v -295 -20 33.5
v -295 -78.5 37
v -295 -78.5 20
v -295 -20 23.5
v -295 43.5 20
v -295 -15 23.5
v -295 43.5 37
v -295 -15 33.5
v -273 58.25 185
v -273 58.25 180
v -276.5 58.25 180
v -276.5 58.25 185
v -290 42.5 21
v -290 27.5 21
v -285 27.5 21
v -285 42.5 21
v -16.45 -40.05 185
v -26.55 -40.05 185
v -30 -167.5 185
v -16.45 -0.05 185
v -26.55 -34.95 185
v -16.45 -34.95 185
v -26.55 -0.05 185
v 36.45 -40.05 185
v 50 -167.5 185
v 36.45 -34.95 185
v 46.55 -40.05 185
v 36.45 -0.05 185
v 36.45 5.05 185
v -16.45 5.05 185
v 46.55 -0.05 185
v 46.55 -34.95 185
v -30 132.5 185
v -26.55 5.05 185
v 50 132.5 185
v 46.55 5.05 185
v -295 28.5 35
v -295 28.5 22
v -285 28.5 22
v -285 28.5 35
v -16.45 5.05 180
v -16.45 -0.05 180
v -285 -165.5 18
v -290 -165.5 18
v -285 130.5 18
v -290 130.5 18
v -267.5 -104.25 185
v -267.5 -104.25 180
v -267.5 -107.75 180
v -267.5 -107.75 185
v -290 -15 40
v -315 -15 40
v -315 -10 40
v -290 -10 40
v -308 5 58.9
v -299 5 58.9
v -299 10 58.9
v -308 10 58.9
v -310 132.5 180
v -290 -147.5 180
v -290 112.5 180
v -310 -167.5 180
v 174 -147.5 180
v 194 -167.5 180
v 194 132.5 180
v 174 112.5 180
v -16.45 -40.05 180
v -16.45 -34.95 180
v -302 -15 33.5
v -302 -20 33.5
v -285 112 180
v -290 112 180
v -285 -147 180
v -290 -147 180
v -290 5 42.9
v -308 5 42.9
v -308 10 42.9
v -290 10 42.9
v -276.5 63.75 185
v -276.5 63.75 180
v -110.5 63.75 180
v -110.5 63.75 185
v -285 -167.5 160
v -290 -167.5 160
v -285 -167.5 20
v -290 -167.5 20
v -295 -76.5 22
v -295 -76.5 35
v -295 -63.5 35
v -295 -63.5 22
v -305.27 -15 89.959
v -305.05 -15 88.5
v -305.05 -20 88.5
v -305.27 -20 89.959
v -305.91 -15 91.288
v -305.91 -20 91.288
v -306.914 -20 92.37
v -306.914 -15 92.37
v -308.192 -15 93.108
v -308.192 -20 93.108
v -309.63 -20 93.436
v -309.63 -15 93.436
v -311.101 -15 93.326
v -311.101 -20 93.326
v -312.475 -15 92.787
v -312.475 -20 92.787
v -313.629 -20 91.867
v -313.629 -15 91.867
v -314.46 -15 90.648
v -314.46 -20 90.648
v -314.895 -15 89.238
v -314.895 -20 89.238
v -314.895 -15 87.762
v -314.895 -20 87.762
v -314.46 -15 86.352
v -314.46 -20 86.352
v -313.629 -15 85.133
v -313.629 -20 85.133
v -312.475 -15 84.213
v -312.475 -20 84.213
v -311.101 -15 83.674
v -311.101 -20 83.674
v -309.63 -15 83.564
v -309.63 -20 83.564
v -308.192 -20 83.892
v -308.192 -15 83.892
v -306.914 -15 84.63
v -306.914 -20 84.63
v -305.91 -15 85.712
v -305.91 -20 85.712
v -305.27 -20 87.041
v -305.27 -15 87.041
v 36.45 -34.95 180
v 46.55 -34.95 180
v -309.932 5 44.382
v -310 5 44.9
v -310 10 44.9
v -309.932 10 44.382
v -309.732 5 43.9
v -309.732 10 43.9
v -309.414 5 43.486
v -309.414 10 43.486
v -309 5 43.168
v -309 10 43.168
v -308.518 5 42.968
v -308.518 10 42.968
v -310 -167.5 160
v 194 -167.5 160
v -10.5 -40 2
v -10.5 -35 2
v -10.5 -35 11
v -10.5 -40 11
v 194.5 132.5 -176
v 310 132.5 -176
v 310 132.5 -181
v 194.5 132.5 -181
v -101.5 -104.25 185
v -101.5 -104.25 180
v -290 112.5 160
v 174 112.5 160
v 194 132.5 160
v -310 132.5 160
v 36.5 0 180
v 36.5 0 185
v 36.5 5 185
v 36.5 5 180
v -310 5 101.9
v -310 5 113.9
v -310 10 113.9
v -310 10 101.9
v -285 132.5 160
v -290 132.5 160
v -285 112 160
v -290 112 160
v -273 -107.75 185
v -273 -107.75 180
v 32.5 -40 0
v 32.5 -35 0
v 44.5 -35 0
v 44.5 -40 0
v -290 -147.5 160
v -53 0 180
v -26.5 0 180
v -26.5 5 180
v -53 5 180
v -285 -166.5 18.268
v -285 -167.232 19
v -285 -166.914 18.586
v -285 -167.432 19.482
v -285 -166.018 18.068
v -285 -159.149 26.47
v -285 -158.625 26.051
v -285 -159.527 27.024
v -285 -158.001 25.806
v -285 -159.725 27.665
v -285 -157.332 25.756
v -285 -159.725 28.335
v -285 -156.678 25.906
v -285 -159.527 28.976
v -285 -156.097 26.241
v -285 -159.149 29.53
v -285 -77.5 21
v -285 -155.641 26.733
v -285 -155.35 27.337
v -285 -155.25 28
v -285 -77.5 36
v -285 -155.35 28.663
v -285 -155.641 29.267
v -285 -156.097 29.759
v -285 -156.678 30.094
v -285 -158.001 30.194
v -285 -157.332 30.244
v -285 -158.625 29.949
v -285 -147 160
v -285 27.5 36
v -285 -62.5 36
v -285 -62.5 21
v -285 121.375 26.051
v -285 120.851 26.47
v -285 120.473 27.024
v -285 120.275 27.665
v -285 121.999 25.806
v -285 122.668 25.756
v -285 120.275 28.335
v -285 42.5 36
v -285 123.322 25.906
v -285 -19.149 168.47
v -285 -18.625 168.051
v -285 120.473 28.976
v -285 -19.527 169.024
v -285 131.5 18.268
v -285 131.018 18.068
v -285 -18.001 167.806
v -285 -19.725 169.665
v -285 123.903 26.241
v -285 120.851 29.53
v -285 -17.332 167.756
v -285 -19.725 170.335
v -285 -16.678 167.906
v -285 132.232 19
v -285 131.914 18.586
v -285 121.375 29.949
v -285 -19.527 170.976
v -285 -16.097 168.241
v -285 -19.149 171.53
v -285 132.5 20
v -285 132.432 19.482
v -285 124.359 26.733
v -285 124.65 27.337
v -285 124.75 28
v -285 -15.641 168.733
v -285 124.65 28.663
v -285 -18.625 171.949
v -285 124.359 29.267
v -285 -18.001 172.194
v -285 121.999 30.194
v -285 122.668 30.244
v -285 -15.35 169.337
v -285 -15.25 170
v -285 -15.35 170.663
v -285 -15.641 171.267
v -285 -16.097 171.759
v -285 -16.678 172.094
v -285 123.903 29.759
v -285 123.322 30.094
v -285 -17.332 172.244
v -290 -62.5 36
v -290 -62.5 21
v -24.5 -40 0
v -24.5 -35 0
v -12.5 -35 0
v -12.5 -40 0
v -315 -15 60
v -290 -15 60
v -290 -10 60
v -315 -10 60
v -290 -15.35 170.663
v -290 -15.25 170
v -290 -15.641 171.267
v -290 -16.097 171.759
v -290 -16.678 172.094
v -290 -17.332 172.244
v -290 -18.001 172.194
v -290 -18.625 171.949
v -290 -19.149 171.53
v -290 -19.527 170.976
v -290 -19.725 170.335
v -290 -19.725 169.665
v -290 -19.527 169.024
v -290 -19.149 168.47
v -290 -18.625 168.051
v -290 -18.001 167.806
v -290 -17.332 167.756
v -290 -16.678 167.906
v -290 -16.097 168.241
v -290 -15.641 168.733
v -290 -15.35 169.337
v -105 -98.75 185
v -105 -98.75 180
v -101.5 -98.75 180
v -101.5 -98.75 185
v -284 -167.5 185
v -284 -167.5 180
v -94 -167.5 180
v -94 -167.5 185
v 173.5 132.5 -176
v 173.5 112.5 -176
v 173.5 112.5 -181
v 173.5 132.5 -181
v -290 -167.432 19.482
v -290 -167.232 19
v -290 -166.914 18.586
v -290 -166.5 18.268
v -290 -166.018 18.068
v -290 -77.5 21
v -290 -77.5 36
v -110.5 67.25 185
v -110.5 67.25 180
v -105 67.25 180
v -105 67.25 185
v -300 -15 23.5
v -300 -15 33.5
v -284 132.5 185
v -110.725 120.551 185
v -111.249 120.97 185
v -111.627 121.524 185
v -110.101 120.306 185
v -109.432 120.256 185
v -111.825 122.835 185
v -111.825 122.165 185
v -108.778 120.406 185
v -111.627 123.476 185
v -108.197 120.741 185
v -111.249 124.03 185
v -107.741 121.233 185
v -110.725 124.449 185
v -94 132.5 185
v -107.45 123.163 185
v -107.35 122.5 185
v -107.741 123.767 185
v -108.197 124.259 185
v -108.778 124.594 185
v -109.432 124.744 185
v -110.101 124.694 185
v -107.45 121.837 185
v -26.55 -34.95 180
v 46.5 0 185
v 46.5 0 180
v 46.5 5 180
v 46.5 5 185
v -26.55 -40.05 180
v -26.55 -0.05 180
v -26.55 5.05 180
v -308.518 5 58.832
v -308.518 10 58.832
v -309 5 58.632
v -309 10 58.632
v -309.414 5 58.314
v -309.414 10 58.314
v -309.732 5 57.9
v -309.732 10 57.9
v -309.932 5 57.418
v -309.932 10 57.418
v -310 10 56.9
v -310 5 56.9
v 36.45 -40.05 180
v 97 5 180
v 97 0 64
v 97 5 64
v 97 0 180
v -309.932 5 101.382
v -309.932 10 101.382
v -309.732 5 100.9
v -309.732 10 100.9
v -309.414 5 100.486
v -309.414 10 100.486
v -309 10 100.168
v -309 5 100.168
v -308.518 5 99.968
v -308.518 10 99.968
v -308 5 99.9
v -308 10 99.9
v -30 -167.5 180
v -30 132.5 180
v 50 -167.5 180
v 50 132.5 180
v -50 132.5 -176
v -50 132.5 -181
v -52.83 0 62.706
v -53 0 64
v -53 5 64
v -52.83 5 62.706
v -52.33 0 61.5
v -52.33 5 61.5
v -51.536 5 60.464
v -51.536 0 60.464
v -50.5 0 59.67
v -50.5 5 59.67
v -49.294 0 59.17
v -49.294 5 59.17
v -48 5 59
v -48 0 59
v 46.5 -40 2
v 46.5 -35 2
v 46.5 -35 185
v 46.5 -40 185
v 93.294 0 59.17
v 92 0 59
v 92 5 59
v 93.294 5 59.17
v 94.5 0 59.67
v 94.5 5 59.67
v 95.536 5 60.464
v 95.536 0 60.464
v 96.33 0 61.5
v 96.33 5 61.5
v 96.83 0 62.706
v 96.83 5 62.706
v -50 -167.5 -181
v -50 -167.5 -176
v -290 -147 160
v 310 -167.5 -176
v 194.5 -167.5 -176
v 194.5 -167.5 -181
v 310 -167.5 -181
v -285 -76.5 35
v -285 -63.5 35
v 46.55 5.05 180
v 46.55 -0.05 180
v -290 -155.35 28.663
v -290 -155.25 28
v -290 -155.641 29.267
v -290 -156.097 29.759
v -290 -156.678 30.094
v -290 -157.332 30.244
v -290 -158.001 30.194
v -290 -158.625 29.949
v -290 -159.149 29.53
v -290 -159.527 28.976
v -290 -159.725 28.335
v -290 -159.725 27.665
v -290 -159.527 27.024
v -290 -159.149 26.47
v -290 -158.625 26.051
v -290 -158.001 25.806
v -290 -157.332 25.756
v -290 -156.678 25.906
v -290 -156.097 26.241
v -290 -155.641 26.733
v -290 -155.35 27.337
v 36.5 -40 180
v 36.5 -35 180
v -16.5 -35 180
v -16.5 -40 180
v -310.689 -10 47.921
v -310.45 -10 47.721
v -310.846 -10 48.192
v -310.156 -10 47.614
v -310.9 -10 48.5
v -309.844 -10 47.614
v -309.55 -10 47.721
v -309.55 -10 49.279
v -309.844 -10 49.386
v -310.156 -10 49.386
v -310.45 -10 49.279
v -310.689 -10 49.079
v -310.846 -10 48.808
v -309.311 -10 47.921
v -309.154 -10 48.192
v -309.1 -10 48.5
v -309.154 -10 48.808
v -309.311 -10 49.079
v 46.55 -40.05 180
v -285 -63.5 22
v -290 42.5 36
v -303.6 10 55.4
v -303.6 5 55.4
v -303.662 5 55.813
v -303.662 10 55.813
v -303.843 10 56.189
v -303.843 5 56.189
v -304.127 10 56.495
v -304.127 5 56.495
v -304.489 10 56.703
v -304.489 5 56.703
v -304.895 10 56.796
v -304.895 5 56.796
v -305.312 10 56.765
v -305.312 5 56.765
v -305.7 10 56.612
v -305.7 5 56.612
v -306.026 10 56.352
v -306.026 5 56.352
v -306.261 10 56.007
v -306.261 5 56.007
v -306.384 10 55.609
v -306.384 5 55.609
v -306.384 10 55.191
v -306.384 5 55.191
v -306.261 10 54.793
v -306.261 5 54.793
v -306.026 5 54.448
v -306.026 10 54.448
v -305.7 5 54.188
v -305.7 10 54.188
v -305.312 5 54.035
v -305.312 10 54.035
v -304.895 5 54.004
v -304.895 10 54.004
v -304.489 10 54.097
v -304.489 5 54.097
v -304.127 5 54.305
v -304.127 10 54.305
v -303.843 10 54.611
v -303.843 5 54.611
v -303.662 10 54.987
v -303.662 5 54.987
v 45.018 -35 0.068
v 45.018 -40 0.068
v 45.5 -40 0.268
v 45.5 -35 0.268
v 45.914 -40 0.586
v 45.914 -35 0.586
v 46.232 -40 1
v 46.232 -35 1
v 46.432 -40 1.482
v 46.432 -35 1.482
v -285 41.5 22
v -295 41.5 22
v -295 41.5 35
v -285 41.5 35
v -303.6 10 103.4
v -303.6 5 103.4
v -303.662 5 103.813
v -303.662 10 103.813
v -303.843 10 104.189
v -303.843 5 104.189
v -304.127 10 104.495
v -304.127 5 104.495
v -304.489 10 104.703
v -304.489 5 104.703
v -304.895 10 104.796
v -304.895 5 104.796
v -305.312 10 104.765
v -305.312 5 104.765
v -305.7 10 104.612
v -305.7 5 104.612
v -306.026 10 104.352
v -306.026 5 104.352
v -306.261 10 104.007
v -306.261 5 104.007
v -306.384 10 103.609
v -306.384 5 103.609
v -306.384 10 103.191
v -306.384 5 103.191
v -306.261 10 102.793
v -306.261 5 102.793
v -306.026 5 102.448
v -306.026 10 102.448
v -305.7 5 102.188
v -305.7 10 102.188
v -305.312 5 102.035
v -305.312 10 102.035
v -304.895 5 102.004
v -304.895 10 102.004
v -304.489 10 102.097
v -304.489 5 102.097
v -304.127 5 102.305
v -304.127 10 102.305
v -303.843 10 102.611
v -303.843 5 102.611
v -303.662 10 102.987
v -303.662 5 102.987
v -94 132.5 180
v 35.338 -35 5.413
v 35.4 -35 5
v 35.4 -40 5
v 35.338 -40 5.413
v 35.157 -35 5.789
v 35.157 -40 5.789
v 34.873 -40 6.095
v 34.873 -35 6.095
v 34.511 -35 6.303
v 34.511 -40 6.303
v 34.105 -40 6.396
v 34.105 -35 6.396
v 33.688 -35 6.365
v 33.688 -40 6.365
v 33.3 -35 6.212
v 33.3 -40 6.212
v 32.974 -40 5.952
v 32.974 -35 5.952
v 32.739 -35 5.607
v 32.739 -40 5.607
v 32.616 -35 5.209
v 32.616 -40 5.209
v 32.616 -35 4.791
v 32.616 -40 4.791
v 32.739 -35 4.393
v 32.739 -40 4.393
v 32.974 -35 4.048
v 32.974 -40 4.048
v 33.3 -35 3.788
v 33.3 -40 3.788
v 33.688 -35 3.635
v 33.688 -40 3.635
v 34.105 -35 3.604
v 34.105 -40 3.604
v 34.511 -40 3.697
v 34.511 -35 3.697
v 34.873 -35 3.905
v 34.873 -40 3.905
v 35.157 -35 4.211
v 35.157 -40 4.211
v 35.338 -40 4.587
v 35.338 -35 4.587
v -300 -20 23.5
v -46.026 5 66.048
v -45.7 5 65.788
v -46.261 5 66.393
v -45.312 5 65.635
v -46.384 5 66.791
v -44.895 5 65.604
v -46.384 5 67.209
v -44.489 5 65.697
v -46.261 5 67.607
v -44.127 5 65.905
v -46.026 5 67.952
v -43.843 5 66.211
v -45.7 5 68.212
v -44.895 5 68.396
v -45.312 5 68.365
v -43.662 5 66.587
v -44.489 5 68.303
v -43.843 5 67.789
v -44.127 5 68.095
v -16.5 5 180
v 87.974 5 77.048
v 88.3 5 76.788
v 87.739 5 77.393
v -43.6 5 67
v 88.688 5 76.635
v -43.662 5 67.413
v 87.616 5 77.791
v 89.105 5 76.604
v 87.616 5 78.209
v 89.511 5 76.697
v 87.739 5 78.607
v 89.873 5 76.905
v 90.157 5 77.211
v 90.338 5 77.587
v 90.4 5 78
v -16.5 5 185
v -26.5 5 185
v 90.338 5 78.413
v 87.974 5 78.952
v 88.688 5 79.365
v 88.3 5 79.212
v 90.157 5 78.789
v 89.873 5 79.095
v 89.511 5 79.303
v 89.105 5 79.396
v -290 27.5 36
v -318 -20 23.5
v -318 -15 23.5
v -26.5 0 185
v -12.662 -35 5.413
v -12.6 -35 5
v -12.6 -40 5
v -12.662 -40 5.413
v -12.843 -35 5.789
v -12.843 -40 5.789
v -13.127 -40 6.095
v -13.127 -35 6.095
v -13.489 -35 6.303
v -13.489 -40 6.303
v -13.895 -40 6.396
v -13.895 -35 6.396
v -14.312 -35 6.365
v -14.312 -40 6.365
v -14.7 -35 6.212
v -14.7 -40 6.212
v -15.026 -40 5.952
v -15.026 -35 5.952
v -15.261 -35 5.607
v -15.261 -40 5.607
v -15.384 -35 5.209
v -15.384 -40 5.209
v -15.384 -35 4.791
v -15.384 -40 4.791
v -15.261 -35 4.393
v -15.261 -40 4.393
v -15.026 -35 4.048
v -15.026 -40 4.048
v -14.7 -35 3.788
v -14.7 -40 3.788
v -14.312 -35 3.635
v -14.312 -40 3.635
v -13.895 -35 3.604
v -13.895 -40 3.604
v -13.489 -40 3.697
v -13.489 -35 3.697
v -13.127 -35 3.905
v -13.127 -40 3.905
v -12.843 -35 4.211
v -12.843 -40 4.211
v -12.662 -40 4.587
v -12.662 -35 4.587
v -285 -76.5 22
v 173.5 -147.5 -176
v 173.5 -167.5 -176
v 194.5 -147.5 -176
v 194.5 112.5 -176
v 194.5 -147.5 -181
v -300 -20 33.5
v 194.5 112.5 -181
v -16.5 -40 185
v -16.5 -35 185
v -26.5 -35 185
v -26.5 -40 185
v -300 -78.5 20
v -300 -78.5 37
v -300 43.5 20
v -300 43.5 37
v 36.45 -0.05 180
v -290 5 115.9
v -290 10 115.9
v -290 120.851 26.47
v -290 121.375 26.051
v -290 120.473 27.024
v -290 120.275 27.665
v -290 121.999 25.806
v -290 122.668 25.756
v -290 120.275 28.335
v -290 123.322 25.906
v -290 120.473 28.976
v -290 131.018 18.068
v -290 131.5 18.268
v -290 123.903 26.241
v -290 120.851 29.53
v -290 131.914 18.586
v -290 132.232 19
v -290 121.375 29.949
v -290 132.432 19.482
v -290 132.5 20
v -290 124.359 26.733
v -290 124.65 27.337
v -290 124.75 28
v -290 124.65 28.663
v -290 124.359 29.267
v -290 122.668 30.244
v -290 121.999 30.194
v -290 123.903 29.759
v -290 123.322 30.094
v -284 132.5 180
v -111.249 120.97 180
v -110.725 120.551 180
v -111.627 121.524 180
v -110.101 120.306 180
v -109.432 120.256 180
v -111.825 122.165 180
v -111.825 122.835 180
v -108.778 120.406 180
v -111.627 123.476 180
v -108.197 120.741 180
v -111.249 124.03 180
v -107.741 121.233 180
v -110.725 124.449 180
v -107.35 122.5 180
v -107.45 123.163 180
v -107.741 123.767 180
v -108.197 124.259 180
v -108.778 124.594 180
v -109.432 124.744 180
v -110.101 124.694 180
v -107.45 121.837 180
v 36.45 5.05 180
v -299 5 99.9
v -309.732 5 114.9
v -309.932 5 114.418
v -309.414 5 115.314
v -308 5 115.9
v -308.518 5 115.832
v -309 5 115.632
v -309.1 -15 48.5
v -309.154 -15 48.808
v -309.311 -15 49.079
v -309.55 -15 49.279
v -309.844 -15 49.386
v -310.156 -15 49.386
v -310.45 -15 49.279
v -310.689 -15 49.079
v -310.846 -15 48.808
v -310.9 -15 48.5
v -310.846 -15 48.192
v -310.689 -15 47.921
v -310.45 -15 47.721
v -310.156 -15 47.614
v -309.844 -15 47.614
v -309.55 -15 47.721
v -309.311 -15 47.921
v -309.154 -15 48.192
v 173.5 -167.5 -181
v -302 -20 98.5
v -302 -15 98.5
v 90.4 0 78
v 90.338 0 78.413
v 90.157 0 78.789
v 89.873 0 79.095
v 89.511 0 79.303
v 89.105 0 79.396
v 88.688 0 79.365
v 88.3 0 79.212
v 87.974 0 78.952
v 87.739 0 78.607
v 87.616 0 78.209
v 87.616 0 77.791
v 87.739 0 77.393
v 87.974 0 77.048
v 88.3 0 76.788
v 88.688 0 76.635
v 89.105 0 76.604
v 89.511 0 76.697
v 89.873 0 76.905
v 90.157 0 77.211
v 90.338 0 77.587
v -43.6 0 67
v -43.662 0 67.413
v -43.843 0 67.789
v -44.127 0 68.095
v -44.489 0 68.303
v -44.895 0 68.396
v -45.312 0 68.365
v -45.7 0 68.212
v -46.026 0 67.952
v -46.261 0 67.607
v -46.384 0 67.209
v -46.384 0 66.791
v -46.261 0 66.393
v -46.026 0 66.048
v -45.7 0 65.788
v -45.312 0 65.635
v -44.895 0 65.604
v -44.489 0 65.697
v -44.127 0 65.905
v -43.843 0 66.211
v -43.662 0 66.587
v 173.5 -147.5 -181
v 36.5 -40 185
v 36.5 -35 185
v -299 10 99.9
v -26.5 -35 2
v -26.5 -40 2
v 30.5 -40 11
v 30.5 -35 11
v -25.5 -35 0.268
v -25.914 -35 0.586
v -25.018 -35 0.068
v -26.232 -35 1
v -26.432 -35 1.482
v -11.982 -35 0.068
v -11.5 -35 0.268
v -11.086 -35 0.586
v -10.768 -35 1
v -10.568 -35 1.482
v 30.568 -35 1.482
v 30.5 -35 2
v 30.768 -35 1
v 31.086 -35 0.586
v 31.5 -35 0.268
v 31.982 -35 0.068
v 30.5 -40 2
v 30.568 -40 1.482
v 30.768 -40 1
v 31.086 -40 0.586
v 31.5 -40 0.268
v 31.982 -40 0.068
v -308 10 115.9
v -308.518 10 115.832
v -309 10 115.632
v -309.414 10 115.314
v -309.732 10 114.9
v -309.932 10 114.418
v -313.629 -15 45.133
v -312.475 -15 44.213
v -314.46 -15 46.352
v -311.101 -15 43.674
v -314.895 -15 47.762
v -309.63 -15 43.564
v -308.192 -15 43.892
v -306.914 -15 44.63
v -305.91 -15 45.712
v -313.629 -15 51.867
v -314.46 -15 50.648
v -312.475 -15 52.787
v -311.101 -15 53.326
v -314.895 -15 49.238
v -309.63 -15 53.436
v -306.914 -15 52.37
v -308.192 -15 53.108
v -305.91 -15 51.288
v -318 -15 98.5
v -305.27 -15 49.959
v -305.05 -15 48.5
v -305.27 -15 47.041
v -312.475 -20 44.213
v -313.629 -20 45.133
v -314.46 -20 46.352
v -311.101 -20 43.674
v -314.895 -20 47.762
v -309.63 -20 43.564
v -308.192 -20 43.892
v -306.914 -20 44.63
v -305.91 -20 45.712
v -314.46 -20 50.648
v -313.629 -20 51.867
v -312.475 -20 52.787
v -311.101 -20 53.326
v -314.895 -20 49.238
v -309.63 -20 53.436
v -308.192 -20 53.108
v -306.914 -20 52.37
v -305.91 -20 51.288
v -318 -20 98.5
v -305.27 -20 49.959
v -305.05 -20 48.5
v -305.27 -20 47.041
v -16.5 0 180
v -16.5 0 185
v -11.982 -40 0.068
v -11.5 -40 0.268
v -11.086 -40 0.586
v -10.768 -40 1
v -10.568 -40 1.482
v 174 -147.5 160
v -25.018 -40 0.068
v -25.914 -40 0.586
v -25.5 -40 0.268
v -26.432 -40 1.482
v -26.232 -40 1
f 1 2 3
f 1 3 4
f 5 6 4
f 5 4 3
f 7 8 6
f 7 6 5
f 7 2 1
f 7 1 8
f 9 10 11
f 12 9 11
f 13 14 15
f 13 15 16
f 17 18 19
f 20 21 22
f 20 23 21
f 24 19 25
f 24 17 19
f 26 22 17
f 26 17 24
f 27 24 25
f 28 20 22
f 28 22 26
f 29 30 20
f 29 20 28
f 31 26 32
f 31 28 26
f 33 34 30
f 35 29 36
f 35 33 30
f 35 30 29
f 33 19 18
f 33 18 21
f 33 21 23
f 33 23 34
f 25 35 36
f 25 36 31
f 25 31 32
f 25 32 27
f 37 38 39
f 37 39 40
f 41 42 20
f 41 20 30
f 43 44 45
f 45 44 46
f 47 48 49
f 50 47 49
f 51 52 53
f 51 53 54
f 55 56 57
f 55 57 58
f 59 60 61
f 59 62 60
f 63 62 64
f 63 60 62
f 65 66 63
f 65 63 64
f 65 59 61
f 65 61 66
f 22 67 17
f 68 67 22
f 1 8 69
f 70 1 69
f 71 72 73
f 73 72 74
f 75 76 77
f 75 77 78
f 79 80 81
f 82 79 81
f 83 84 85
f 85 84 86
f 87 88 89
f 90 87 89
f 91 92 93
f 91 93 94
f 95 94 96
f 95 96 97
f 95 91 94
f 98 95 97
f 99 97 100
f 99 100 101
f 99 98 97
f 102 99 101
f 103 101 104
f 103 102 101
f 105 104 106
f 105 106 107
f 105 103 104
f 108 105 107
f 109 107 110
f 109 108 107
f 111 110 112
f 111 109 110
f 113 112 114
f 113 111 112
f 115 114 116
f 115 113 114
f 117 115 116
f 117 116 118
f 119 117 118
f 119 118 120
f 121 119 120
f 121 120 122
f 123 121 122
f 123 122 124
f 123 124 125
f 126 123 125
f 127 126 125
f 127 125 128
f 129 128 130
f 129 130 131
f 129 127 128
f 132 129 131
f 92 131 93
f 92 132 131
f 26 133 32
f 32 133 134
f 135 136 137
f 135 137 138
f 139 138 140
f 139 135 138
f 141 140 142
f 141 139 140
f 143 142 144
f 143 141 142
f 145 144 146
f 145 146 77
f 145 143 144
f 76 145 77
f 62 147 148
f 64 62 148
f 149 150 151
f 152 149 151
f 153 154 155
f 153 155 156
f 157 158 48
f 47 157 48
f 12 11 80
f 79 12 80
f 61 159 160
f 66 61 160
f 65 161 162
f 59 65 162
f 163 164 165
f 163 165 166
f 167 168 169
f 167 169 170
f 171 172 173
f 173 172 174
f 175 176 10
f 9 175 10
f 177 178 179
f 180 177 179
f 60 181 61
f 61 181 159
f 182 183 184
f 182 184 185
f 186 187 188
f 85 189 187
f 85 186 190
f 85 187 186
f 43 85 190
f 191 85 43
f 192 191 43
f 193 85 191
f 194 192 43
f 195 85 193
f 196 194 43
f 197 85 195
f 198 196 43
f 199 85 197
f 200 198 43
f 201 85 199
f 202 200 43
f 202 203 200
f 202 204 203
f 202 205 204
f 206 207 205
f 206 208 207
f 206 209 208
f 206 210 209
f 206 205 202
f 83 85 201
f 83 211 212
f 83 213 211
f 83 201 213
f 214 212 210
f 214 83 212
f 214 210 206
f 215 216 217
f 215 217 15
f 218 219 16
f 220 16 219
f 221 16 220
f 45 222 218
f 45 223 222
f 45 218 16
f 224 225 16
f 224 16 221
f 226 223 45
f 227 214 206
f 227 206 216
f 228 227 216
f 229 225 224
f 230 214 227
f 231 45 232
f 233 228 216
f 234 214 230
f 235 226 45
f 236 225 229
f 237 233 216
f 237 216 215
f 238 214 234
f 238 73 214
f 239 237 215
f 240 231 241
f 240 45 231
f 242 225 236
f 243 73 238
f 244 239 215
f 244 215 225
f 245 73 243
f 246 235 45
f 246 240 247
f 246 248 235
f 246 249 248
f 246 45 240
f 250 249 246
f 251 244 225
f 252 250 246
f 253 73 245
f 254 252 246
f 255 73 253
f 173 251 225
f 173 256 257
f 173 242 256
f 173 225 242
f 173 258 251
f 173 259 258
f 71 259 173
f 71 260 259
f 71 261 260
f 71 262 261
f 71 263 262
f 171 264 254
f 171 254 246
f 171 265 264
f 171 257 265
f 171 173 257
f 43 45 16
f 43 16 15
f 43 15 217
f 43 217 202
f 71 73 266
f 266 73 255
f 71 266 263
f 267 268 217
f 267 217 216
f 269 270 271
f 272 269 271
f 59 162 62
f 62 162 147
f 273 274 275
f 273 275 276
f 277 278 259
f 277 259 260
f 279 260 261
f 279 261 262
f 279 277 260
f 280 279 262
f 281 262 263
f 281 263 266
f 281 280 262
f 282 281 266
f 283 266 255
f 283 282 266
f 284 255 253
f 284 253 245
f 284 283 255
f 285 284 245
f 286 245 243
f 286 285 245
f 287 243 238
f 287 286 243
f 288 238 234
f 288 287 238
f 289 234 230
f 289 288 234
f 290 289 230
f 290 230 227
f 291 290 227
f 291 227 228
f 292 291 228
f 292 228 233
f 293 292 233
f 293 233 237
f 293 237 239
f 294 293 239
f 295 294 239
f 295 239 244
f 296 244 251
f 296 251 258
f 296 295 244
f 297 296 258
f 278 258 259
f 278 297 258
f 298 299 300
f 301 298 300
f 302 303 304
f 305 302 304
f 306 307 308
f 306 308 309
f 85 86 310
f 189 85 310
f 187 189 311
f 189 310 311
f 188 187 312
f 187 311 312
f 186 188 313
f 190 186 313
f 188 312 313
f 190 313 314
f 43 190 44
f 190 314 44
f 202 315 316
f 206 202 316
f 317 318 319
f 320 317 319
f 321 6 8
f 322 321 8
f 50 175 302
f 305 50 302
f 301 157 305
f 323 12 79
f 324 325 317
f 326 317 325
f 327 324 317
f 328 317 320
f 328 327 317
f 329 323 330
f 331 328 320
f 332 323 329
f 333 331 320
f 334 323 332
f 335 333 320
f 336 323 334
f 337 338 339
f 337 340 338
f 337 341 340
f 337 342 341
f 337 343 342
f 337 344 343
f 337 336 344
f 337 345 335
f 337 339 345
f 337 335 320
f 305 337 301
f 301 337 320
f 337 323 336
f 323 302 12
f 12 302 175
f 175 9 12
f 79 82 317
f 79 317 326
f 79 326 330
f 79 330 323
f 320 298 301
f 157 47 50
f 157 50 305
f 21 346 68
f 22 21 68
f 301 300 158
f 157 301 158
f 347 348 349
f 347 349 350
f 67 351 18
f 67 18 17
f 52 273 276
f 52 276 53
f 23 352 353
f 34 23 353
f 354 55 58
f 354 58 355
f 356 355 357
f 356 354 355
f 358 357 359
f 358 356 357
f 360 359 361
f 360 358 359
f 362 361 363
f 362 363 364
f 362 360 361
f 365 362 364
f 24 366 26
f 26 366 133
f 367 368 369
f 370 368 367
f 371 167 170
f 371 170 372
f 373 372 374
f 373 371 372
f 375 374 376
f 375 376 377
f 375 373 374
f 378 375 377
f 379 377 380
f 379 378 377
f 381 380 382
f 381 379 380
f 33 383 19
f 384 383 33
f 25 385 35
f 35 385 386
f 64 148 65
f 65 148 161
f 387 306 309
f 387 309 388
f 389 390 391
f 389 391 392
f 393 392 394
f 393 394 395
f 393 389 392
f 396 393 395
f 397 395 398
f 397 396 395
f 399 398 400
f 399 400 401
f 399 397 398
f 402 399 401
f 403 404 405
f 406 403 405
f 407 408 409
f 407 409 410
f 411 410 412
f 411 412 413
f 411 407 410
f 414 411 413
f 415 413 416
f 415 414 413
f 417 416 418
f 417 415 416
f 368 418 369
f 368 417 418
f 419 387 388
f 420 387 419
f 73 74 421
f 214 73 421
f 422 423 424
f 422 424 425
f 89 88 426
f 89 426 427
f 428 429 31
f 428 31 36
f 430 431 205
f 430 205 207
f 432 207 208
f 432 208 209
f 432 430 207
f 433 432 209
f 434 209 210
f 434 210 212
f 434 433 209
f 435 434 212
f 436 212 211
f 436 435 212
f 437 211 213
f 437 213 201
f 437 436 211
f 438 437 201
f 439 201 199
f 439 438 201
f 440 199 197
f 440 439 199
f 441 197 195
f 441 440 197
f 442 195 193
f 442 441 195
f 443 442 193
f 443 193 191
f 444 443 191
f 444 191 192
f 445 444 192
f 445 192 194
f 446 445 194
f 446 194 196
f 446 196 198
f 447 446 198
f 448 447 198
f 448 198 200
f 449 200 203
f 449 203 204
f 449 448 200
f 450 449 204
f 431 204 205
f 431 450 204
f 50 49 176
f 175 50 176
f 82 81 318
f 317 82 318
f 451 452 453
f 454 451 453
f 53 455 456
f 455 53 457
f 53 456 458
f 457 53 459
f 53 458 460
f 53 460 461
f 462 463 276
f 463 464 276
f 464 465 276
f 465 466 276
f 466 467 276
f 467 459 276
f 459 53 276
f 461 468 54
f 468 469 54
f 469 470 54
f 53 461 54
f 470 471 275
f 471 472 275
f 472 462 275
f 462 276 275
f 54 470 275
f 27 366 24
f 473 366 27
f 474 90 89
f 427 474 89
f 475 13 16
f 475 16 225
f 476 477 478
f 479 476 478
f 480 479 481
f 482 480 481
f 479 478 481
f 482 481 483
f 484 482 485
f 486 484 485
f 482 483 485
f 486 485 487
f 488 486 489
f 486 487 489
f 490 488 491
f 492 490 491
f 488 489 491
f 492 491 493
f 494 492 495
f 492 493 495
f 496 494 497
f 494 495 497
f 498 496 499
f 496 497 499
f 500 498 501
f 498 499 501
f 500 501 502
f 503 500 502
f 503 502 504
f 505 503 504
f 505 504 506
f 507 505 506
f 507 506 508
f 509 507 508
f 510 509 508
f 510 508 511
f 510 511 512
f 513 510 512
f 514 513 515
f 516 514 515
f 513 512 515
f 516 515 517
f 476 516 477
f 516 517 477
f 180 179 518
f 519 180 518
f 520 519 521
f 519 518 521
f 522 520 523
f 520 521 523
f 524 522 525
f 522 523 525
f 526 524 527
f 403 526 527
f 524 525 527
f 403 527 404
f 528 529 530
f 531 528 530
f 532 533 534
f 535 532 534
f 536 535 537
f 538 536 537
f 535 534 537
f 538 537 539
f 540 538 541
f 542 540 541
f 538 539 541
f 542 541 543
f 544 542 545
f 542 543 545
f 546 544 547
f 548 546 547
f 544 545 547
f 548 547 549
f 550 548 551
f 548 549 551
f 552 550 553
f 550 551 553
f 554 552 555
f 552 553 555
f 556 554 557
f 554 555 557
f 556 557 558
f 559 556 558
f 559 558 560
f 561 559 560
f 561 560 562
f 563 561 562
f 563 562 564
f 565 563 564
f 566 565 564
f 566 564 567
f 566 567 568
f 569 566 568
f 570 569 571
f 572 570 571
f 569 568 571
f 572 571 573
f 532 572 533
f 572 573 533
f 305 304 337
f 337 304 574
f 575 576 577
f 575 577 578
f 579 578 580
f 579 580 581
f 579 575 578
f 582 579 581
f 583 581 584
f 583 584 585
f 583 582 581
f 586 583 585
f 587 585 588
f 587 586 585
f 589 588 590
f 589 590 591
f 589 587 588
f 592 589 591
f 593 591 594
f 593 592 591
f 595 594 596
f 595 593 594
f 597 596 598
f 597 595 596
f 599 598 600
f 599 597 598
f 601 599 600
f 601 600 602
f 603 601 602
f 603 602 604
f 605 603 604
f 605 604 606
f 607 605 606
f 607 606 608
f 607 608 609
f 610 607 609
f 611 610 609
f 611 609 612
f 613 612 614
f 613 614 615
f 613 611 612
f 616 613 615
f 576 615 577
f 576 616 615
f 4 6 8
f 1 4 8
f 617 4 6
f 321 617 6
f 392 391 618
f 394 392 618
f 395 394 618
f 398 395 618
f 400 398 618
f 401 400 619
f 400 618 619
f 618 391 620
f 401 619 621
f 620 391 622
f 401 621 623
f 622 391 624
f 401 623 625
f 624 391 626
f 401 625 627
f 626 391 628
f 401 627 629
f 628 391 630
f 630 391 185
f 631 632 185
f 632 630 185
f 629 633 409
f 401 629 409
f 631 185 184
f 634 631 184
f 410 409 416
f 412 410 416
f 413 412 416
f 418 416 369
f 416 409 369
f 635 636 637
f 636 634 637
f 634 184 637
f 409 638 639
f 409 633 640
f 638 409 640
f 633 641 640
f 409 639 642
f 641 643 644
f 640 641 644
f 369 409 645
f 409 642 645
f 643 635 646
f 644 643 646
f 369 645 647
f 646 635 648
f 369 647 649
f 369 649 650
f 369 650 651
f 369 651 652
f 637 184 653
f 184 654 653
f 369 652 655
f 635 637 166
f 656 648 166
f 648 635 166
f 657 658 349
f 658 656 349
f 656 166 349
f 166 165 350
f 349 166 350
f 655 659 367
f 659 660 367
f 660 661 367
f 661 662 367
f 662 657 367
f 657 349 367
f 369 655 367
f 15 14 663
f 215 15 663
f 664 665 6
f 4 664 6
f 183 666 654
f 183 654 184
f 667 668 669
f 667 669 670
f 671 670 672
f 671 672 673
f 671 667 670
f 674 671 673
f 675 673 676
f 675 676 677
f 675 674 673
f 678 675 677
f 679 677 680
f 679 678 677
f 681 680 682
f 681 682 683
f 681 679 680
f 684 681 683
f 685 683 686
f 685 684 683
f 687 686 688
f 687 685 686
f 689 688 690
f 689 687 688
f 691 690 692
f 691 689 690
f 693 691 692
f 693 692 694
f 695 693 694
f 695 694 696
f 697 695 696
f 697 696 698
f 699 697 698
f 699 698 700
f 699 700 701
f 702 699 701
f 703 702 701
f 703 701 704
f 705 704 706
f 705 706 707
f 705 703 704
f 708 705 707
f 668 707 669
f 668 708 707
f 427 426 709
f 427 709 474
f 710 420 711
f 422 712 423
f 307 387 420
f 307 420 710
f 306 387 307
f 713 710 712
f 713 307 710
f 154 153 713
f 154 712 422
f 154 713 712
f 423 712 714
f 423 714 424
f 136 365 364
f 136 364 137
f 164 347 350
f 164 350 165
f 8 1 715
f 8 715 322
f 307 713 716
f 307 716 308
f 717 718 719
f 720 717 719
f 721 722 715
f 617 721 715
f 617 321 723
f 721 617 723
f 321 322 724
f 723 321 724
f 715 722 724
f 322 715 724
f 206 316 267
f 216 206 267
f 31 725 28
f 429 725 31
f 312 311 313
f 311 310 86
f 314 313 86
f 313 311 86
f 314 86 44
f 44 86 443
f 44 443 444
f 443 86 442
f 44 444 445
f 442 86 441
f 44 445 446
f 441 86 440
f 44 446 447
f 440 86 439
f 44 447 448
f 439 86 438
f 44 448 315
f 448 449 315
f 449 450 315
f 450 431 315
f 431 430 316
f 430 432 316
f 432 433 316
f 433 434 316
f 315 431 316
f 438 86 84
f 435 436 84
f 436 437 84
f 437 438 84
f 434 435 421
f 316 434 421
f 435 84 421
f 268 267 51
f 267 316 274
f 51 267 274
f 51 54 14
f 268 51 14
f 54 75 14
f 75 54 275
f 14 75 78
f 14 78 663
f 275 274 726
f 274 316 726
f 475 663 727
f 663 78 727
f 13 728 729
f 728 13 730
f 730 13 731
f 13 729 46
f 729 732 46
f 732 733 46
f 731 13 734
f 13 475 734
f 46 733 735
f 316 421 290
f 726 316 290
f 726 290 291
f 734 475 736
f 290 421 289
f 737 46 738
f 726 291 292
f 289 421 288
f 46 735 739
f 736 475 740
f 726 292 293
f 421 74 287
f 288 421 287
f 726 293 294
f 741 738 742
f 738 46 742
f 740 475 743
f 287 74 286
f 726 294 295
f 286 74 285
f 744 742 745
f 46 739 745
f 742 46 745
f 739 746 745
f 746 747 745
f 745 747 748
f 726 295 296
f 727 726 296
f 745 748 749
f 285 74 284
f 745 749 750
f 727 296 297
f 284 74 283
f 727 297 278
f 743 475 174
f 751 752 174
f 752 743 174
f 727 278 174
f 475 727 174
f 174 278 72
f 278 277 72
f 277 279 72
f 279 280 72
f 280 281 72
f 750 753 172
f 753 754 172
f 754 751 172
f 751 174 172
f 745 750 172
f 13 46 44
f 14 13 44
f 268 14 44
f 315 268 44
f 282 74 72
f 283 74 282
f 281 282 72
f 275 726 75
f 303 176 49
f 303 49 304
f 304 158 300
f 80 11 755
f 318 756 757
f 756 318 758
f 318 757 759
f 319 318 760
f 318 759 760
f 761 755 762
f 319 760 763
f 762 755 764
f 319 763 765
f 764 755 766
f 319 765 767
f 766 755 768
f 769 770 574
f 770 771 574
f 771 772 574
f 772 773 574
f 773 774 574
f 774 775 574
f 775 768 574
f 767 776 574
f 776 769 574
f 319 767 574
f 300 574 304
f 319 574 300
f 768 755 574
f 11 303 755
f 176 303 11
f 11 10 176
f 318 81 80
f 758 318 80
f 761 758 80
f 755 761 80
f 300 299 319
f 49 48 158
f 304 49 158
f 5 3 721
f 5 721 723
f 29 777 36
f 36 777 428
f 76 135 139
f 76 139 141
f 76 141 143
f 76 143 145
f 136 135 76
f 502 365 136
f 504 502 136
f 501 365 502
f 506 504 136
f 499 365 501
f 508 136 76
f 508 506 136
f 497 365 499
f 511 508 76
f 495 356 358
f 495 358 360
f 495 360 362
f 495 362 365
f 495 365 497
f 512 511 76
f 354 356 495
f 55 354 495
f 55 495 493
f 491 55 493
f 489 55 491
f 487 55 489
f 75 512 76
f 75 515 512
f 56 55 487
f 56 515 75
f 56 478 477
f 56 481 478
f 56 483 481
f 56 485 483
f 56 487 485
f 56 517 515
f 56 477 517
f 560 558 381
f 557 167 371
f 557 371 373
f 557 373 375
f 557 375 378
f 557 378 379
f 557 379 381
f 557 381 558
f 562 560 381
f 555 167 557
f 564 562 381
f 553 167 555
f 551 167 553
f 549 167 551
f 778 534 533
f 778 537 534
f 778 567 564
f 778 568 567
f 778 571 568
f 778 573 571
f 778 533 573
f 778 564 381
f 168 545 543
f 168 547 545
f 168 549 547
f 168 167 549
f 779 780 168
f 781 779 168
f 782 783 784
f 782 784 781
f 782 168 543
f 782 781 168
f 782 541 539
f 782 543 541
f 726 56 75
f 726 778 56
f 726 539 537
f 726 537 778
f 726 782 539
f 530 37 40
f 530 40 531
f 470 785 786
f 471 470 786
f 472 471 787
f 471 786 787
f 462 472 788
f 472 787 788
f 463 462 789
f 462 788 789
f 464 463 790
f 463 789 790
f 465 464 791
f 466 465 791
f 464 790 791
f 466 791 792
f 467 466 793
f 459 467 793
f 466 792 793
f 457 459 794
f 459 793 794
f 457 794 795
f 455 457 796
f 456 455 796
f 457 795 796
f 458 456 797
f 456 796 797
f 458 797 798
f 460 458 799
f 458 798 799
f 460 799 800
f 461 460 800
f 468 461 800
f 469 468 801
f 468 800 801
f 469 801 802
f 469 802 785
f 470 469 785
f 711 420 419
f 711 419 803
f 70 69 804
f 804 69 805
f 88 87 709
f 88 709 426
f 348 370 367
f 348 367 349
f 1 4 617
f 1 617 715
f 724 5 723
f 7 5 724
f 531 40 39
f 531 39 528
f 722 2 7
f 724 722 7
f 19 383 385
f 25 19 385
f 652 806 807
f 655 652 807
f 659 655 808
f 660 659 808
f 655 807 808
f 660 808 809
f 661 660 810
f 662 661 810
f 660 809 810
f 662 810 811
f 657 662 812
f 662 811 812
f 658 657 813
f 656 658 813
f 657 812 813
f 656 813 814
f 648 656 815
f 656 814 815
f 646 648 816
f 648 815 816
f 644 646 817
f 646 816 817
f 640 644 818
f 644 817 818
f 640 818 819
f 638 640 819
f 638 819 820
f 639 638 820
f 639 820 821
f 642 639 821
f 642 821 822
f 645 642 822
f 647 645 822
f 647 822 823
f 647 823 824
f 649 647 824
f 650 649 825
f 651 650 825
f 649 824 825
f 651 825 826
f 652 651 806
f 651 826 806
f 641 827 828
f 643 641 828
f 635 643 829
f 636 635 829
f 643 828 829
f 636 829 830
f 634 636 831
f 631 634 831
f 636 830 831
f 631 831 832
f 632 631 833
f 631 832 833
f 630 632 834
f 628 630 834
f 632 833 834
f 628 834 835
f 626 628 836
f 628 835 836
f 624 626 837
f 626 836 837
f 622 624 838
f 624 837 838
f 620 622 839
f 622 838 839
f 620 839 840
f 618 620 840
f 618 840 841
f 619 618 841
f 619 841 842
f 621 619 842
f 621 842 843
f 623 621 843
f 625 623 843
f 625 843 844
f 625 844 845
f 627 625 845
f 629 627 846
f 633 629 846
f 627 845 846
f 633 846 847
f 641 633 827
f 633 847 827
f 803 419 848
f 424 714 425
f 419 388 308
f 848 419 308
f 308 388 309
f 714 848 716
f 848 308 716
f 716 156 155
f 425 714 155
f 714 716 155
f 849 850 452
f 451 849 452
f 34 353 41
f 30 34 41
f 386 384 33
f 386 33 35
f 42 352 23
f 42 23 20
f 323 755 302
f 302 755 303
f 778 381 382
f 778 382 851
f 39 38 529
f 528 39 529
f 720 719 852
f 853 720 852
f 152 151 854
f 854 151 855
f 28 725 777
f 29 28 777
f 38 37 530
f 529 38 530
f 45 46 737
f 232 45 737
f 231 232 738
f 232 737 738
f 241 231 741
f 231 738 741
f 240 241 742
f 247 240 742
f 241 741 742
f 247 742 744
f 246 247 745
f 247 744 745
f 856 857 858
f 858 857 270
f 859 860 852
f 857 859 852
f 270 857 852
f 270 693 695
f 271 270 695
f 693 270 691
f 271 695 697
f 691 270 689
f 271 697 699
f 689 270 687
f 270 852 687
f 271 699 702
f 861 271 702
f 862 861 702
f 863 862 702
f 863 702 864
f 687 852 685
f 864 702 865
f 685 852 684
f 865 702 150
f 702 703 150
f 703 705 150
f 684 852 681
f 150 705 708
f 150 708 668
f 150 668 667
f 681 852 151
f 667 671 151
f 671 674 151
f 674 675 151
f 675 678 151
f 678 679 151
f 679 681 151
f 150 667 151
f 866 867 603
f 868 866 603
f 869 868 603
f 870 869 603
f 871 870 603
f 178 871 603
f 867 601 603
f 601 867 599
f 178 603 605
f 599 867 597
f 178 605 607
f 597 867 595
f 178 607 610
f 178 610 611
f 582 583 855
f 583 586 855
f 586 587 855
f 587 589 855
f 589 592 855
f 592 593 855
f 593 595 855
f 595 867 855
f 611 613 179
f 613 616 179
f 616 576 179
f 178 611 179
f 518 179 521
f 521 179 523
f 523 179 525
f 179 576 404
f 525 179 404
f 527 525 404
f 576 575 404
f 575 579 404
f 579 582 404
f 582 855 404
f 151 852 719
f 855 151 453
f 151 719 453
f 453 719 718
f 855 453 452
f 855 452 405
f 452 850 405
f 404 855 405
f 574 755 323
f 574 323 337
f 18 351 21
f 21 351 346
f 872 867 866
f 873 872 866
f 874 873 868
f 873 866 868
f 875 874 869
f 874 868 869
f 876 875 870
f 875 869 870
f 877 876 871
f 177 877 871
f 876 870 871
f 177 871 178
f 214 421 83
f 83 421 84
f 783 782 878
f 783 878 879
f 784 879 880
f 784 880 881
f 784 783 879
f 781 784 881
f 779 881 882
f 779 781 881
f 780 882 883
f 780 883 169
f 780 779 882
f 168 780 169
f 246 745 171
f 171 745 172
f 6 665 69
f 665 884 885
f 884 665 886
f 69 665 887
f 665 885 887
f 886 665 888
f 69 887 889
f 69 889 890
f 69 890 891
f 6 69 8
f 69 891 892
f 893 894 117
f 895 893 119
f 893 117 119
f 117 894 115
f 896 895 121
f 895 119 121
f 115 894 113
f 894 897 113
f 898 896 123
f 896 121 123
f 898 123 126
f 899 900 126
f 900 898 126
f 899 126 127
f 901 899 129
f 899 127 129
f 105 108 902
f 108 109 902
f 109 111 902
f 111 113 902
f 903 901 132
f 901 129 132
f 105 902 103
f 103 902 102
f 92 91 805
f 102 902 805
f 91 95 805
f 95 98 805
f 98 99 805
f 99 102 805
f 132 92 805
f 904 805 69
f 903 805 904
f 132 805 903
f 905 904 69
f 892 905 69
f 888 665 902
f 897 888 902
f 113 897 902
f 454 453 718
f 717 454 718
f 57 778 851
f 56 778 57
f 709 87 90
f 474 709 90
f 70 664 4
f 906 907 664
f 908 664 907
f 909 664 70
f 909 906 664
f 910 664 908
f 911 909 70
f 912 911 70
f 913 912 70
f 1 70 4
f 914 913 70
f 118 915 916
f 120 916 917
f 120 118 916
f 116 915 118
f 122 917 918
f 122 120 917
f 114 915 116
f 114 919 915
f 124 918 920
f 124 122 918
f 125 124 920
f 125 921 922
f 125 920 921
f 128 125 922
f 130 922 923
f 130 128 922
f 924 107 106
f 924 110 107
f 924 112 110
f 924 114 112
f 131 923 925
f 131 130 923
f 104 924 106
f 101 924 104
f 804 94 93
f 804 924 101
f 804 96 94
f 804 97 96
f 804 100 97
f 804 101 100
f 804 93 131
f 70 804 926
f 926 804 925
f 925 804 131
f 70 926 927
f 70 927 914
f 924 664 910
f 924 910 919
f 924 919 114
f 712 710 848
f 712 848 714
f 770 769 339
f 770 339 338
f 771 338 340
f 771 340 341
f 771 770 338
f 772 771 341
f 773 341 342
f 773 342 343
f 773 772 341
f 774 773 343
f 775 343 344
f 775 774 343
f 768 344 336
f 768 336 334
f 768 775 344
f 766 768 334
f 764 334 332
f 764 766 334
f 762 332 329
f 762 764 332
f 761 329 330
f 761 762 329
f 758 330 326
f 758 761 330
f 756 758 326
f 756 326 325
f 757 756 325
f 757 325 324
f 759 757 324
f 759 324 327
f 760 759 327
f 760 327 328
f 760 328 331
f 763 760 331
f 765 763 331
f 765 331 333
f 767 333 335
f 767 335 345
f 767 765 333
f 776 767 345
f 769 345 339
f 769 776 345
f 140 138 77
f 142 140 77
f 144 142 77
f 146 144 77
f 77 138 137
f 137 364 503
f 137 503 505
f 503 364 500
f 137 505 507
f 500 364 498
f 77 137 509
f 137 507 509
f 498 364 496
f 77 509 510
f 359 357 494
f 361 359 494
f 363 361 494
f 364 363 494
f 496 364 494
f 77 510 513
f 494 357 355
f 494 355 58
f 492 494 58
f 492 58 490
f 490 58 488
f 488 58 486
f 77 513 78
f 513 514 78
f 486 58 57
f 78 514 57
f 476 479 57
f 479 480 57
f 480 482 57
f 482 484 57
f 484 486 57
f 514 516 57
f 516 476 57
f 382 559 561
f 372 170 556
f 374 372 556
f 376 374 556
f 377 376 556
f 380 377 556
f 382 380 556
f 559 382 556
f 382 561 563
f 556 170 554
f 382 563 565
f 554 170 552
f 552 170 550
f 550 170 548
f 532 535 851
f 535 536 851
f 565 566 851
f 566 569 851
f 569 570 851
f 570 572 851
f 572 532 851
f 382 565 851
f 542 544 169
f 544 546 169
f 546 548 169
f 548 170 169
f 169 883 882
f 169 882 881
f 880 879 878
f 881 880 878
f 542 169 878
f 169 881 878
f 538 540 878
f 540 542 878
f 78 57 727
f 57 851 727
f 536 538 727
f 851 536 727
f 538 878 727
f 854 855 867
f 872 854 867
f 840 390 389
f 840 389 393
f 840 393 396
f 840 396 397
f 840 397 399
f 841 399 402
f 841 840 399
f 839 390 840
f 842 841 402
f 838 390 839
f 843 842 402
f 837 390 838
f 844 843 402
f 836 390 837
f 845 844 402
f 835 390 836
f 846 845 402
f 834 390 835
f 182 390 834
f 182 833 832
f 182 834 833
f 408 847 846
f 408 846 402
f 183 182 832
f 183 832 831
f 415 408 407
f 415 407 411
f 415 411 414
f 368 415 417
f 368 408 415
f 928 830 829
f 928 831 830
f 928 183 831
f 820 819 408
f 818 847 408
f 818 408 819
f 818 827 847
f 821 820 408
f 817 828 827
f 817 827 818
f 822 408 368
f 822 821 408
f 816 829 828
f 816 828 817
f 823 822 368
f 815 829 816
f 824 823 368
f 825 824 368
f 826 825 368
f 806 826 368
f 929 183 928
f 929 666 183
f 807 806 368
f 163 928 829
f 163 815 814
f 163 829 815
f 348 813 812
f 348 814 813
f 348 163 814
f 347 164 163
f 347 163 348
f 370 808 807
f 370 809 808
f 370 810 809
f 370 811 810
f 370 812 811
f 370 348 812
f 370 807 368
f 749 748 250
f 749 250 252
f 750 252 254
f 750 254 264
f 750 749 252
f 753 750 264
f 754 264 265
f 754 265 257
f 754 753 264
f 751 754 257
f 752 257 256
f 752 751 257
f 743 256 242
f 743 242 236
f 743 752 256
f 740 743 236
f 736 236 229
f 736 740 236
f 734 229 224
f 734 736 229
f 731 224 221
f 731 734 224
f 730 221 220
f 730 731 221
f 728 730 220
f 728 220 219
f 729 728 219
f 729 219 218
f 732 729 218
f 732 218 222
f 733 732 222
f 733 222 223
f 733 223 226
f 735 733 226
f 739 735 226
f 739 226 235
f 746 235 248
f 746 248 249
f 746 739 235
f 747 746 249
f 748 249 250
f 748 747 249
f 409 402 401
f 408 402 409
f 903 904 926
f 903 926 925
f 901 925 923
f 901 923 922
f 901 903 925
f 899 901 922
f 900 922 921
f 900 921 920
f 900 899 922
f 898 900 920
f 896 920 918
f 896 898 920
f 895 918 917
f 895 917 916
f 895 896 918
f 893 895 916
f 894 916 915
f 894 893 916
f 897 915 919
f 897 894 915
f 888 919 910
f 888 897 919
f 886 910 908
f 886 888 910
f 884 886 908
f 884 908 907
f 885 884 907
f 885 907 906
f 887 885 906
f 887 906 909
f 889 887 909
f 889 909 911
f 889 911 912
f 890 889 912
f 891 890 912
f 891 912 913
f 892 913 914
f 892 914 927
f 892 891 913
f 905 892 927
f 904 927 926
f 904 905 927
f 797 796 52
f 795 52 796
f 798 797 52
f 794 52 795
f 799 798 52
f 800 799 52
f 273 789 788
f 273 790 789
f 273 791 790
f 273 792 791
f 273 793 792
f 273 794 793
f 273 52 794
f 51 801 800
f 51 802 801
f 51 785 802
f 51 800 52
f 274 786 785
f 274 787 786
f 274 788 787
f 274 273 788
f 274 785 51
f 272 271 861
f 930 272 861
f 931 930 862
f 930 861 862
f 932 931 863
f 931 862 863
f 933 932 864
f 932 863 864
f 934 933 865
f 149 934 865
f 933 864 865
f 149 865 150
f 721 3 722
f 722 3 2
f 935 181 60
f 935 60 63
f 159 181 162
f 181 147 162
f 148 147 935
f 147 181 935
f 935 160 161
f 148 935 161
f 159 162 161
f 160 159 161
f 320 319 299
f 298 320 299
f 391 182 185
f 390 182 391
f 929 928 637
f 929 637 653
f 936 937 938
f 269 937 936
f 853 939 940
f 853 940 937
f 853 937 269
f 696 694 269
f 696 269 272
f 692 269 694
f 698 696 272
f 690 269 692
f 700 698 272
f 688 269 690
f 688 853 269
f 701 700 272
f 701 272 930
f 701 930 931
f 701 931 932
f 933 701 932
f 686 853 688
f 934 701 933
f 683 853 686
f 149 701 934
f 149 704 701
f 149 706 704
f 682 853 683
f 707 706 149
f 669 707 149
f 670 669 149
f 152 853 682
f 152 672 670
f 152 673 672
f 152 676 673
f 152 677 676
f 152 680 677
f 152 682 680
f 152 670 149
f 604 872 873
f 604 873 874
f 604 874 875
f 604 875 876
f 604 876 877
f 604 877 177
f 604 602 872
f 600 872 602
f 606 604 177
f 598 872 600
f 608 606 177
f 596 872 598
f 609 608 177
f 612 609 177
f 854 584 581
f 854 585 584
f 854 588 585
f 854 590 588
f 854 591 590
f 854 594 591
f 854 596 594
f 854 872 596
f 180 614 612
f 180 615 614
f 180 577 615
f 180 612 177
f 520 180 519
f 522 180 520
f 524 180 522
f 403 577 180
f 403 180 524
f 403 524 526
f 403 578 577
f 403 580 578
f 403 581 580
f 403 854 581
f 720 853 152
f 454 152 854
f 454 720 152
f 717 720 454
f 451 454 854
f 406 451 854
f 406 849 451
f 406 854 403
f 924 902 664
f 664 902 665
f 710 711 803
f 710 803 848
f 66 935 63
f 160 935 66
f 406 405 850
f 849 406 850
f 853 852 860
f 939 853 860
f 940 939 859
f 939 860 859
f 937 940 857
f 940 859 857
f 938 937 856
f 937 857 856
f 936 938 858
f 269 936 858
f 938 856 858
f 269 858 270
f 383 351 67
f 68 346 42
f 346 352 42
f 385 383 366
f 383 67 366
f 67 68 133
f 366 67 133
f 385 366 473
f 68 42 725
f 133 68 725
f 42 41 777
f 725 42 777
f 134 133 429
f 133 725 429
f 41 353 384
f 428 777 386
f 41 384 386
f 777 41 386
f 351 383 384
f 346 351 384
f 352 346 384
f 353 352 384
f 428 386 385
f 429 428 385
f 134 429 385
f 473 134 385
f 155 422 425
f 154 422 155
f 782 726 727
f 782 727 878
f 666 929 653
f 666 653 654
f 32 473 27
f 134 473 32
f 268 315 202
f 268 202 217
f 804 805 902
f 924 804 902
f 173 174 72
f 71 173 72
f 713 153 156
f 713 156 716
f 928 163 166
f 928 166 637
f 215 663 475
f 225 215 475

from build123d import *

# Parameters (mm, degrees)
F2_R      = 1.4
F3_DEPTH  = 5
F0_R      = 1.4
F4_DEPTH  = 5
F9_W      = 464
F9_H      = 20
F9_W_2    = 20
F9_H_2    = 260
F10_DEPTH = 20
F11_DEPTH = 5
F16_W     = 190
F16_H     = 260
F16_H_2   = 20
F16_R     = 2.25
F17_DEPTH = 5
F18_W     = 80
F18_H     = 300
F18_W_2   = 10.1
F18_H_2   = 5.1
F19_DEPTH = 5
F15_R     = 2.25
F15_W     = 15
F15_H     = 15
F22_DEPTH = 5
F21_W     = 13
F21_H     = 13
F23_DEPTH = 10
F24_W     = 122
F24_H     = 17
F24_W_2   = 5
F24_H_2   = 10
F25_DEPTH = 5
F27_R     = 0.9
F28_DEPTH = 5
F30_R     = 1.4
F31_DEPTH = 5
F32_R     = 4.95
F33_DEPTH = 5


# Not quite as in the source:
# - a feature of the source that left no trace in its solid (it failed there, or was rolled back) is left out
# - a feature names something its author has since deleted; it is built from what else it names


with BuildPart() as f3:
    # F2 (on offset) → F3 (new body)
    with BuildSketch(Plane.XZ.offset(35)):
        with BuildLine():
            ThreePointArc((-26.5, 2), (-25.9142135624, 0.5857864376), (-24.5, 0))
            Line((-24.5, 0), (-12.5, 0))
            ThreePointArc((-12.5, 0), (-11.0857864376, 0.5857864376), (-10.5, 2))
            Line((-10.5, 2), (-10.5, 11))
            Line((-10.5, 11), (30.5, 11))
            Line((30.5, 11), (30.5, 2))
            ThreePointArc((30.5, 2), (31.0857864376, 0.5857864376), (32.5, 0))
            Line((32.5, 0), (44.5, 0))
            ThreePointArc((44.5, 0), (45.9142135624, 0.5857864376), (46.5, 2))
            Line((46.5, 2), (46.5, 100))
            Line((46.5, 100), (46.5, 185))
            Line((46.5, 185), (36.5, 185))
            Line((36.5, 185), (36.5, 180))
            Line((36.5, 180), (-16.5, 180))
            Line((-16.5, 180), (-16.5, 185))
            Line((-16.5, 185), (-26.5, 185))
            Line((-26.5, 185), (-26.5, 180))
            Line((-26.5, 180), (-26.5, 2))
        make_face()
        with Locations((-14, 5)):
            Circle(F2_R, mode=Mode.SUBTRACT)
        with Locations((34, 5)):
            Circle(F2_R, mode=Mode.SUBTRACT)
    extrude(amount=F3_DEPTH)


with BuildPart() as f4:
    # F0 (on Front) → F4 (new body)
    with BuildSketch(Plane.XZ):
        with BuildLine():
            Line((-53, 180), (-53, 64))
            ThreePointArc((-53, 64), (-51.5355339059, 60.4644660941), (-48, 59))
            Line((-48, 59), (92, 59))
            ThreePointArc((92, 59), (95.5355339059, 60.4644660941), (97, 64))
            Line((97, 64), (97, 180))
            Line((97, 180), (46.5, 180))
            Line((46.5, 180), (46.5, 185))
            Line((46.5, 185), (36.5, 185))
            Line((36.5, 185), (36.5, 180))
            Line((36.5, 180), (-16.5, 180))
            Line((-16.5, 180), (-16.5, 185))
            Line((-16.5, 185), (-26.5, 185))
            Line((-26.5, 185), (-26.5, 180))
            Line((-26.5, 180), (-53, 180))
        make_face()
        with Locations((-45, 67)):
            Circle(F0_R, mode=Mode.SUBTRACT)
        with Locations((89, 78)):
            Circle(F0_R, mode=Mode.SUBTRACT)
    extrude(amount=-F4_DEPTH)


with BuildPart() as f10:
    # F9 (on offset) → F10 (new body)
    with BuildSketch(Plane.XY.offset(160)):
        with Locations((-58, 122.5)):
            Rectangle(F9_W, F9_H)
        with Locations((-300, -17.5)):
            Rectangle(F9_W_2, F9_H_2)
        with Locations((-300, 122.5)):
            Rectangle(F9_W_2, F9_H)
        with Locations((184, -17.5)):
            Rectangle(F9_W_2, F9_H_2)
        with Locations((184, 122.5)):
            Rectangle(F9_W_2, F9_H)
        with Locations((-300, -157.5)):
            Rectangle(F9_W_2, F9_H)
        with Locations((-58, -157.5)):
            Rectangle(F9_W, F9_H)
        with Locations((184, -157.5)):
            Rectangle(F9_W_2, F9_H)
    extrude(amount=F10_DEPTH)


with BuildPart() as f11:
    # F7 (on offset) → F11 (new body)
    with BuildSketch(Plane.XY.offset(-176)):
        Polygon((173.5, 112.5), (173.5, 132.5), (-50, 132.5), (-50, -167.5), (173.5, -167.5), (173.5, -147.5), (194.5, -147.5), (194.5, -167.5), (310, -167.5), (310, 132.5), (194.5, 132.5), (194.5, 112.5), align=None)
    extrude(amount=-F11_DEPTH)


with BuildPart() as f17:
    # F16 (on face) → F17 (new body)
    with BuildSketch(Plane.XY.offset(180)):
        with Locations((-189, -17.5)):
            Rectangle(F16_W, F16_H)
        Polygon((-273, -107.75), (-273, -104.25), (-273, 58.25), (-276.5, 58.25), (-276.5, 63.75), (-273, 63.75), (-110.5, 63.75), (-110.5, 67.25), (-105, 67.25), (-105, 63.75), (-105, -98.75), (-101.5, -98.75), (-101.5, -104.25), (-105, -104.25), (-267.5, -104.25), (-267.5, -107.75), align=None, mode=Mode.SUBTRACT)
        with Locations((-189, -157.5)):
            Rectangle(F16_W, F16_H_2)
        with Locations((-189, 122.5)):
            Rectangle(F16_W, F16_H_2)
        with Locations((-109.6, 122.5)):
            Circle(F16_R, mode=Mode.SUBTRACT)
    extrude(amount=F17_DEPTH)


with BuildPart() as f19:
    # F18 (on face) → F19 (new body)
    with BuildSketch(Plane.XY.offset(180)):
        with Locations((10, -17.5)):
            Rectangle(F18_W, F18_H)
        with Locations((-21.5, -37.5)):
            Rectangle(F18_W_2, F18_H_2, mode=Mode.SUBTRACT)
        with Locations((41.5, -37.5)):
            Rectangle(F18_W_2, F18_H_2, mode=Mode.SUBTRACT)
        with Locations((-21.5, 2.5)):
            Rectangle(F18_W_2, F18_H_2, mode=Mode.SUBTRACT)
        with Locations((41.5, 2.5)):
            Rectangle(F18_W_2, F18_H_2, mode=Mode.SUBTRACT)
    extrude(amount=F19_DEPTH)


with BuildPart() as f22:
    # F15 (on face) → F22 (new body)
    with BuildSketch(Plane.YZ.offset(-290)):
        with BuildLine():
            ThreePointArc((-167.5, 20), (-166.9142135624, 18.5857864376), (-165.5, 18))
            Line((-165.5, 18), (130.5, 18))
            ThreePointArc((130.5, 18), (131.9142135624, 18.5857864376), (132.5, 20))
            Line((132.5, 20), (132.5, 160))
            Line((132.5, 160), (112, 160))
            Line((112, 160), (112, 180))
            Line((112, 180), (-147, 180))
            Line((-147, 180), (-147, 160))
            Line((-147, 160), (-167.5, 160))
            Line((-167.5, 160), (-167.5, 20))
        make_face()
        with Locations((-157.5, 28)):
            Circle(F15_R, mode=Mode.SUBTRACT)
        with Locations((-70, 28.5)):
            Rectangle(F15_W, F15_H, mode=Mode.SUBTRACT)
        with Locations((35, 28.5)):
            Rectangle(F15_W, F15_H, mode=Mode.SUBTRACT)
        with Locations((122.5, 28)):
            Circle(F15_R, mode=Mode.SUBTRACT)
        with Locations((-17.5, 170)):
            Circle(F15_R, mode=Mode.SUBTRACT)
    extrude(amount=F22_DEPTH)

    # F27 (on offset) → F28 (join)
    with BuildSketch(Plane.XZ.offset(15)):
        Polygon((-315, 40), (-290, 40), (-285, 40), (-285, 45), (-290, 45), (-290, 55), (-285, 55), (-285, 60), (-290, 60), (-315, 60), align=None)
        with Locations((-310, 48.5)):
            Circle(F27_R, mode=Mode.SUBTRACT)
    extrude(amount=-F28_DEPTH)

    # F30 (on offset) → F31 (join)
    with BuildSketch(Plane.XZ.offset(-5)):
        with BuildLine():
            ThreePointArc((-308, 115.9), (-309.4142135624, 115.3142135624), (-310, 113.9))
            Line((-310, 113.9), (-310, 101.9))
            ThreePointArc((-310, 101.9), (-309.4142135624, 100.4857864376), (-308, 99.9))
            Line((-308, 99.9), (-299, 99.9))
            Line((-299, 99.9), (-299, 58.9))
            Line((-299, 58.9), (-308, 58.9))
            ThreePointArc((-308, 58.9), (-309.4142135624, 58.3142135624), (-310, 56.9))
            Line((-310, 56.9), (-310, 44.9))
            ThreePointArc((-310, 44.9), (-309.4142135624, 43.4857864376), (-308, 42.9))
            Line((-308, 42.9), (-290, 42.9))
            Line((-290, 42.9), (-290, 115.9))
            Line((-290, 115.9), (-308, 115.9))
        make_face()
        with Locations((-305, 55.4)):
            Circle(F30_R, mode=Mode.SUBTRACT)
        with Locations((-305, 103.4)):
            Circle(F30_R, mode=Mode.SUBTRACT)
    extrude(amount=-F31_DEPTH)


with BuildPart() as f23:
    # F21 (on offset) → F23 (new body)
    with BuildSketch(Plane.YZ.offset(-295)):
        with Locations((35, 28.5)):
            Rectangle(F21_W, F21_H)
    extrude(amount=F23_DEPTH)


with BuildPart() as f23b:
    # F21 (on offset) → F23, piece 2 (new body)
    with BuildSketch(Plane.YZ.offset(-295)):
        with Locations((-70, 28.5)):
            Rectangle(F21_W, F21_H)
    extrude(amount=F23_DEPTH)


with BuildPart() as f25:
    # F24 (on offset) → F25 (new body)
    with BuildSketch(Plane.YZ.offset(-295)):
        with Locations((-17.5, 28.5)):
            Rectangle(F24_W, F24_H)
        with Locations((-17.5, 28.5)):
            Rectangle(F24_W_2, F24_H_2, mode=Mode.SUBTRACT)
    extrude(amount=-F25_DEPTH)


with BuildPart() as f33:
    # F32 (on offset) → F33 (new body)
    with BuildSketch(Plane.XZ.offset(15)):
        Polygon((-318, 23.5), (-295, 23.5), (-295, 33.5), (-302, 33.5), (-302, 98.5), (-318, 98.5), align=None)
        with Locations((-310, 48.5)):
            Circle(F32_R, mode=Mode.SUBTRACT)
        with Locations((-310, 88.5)):
            Circle(F32_R, mode=Mode.SUBTRACT)
    extrude(amount=F33_DEPTH)


solid = Compound([f3.part, f4.part, f10.part, f11.part, f17.part, f19.part, f22.part, f23.part, f23b.part, f25.part, f33.part])
